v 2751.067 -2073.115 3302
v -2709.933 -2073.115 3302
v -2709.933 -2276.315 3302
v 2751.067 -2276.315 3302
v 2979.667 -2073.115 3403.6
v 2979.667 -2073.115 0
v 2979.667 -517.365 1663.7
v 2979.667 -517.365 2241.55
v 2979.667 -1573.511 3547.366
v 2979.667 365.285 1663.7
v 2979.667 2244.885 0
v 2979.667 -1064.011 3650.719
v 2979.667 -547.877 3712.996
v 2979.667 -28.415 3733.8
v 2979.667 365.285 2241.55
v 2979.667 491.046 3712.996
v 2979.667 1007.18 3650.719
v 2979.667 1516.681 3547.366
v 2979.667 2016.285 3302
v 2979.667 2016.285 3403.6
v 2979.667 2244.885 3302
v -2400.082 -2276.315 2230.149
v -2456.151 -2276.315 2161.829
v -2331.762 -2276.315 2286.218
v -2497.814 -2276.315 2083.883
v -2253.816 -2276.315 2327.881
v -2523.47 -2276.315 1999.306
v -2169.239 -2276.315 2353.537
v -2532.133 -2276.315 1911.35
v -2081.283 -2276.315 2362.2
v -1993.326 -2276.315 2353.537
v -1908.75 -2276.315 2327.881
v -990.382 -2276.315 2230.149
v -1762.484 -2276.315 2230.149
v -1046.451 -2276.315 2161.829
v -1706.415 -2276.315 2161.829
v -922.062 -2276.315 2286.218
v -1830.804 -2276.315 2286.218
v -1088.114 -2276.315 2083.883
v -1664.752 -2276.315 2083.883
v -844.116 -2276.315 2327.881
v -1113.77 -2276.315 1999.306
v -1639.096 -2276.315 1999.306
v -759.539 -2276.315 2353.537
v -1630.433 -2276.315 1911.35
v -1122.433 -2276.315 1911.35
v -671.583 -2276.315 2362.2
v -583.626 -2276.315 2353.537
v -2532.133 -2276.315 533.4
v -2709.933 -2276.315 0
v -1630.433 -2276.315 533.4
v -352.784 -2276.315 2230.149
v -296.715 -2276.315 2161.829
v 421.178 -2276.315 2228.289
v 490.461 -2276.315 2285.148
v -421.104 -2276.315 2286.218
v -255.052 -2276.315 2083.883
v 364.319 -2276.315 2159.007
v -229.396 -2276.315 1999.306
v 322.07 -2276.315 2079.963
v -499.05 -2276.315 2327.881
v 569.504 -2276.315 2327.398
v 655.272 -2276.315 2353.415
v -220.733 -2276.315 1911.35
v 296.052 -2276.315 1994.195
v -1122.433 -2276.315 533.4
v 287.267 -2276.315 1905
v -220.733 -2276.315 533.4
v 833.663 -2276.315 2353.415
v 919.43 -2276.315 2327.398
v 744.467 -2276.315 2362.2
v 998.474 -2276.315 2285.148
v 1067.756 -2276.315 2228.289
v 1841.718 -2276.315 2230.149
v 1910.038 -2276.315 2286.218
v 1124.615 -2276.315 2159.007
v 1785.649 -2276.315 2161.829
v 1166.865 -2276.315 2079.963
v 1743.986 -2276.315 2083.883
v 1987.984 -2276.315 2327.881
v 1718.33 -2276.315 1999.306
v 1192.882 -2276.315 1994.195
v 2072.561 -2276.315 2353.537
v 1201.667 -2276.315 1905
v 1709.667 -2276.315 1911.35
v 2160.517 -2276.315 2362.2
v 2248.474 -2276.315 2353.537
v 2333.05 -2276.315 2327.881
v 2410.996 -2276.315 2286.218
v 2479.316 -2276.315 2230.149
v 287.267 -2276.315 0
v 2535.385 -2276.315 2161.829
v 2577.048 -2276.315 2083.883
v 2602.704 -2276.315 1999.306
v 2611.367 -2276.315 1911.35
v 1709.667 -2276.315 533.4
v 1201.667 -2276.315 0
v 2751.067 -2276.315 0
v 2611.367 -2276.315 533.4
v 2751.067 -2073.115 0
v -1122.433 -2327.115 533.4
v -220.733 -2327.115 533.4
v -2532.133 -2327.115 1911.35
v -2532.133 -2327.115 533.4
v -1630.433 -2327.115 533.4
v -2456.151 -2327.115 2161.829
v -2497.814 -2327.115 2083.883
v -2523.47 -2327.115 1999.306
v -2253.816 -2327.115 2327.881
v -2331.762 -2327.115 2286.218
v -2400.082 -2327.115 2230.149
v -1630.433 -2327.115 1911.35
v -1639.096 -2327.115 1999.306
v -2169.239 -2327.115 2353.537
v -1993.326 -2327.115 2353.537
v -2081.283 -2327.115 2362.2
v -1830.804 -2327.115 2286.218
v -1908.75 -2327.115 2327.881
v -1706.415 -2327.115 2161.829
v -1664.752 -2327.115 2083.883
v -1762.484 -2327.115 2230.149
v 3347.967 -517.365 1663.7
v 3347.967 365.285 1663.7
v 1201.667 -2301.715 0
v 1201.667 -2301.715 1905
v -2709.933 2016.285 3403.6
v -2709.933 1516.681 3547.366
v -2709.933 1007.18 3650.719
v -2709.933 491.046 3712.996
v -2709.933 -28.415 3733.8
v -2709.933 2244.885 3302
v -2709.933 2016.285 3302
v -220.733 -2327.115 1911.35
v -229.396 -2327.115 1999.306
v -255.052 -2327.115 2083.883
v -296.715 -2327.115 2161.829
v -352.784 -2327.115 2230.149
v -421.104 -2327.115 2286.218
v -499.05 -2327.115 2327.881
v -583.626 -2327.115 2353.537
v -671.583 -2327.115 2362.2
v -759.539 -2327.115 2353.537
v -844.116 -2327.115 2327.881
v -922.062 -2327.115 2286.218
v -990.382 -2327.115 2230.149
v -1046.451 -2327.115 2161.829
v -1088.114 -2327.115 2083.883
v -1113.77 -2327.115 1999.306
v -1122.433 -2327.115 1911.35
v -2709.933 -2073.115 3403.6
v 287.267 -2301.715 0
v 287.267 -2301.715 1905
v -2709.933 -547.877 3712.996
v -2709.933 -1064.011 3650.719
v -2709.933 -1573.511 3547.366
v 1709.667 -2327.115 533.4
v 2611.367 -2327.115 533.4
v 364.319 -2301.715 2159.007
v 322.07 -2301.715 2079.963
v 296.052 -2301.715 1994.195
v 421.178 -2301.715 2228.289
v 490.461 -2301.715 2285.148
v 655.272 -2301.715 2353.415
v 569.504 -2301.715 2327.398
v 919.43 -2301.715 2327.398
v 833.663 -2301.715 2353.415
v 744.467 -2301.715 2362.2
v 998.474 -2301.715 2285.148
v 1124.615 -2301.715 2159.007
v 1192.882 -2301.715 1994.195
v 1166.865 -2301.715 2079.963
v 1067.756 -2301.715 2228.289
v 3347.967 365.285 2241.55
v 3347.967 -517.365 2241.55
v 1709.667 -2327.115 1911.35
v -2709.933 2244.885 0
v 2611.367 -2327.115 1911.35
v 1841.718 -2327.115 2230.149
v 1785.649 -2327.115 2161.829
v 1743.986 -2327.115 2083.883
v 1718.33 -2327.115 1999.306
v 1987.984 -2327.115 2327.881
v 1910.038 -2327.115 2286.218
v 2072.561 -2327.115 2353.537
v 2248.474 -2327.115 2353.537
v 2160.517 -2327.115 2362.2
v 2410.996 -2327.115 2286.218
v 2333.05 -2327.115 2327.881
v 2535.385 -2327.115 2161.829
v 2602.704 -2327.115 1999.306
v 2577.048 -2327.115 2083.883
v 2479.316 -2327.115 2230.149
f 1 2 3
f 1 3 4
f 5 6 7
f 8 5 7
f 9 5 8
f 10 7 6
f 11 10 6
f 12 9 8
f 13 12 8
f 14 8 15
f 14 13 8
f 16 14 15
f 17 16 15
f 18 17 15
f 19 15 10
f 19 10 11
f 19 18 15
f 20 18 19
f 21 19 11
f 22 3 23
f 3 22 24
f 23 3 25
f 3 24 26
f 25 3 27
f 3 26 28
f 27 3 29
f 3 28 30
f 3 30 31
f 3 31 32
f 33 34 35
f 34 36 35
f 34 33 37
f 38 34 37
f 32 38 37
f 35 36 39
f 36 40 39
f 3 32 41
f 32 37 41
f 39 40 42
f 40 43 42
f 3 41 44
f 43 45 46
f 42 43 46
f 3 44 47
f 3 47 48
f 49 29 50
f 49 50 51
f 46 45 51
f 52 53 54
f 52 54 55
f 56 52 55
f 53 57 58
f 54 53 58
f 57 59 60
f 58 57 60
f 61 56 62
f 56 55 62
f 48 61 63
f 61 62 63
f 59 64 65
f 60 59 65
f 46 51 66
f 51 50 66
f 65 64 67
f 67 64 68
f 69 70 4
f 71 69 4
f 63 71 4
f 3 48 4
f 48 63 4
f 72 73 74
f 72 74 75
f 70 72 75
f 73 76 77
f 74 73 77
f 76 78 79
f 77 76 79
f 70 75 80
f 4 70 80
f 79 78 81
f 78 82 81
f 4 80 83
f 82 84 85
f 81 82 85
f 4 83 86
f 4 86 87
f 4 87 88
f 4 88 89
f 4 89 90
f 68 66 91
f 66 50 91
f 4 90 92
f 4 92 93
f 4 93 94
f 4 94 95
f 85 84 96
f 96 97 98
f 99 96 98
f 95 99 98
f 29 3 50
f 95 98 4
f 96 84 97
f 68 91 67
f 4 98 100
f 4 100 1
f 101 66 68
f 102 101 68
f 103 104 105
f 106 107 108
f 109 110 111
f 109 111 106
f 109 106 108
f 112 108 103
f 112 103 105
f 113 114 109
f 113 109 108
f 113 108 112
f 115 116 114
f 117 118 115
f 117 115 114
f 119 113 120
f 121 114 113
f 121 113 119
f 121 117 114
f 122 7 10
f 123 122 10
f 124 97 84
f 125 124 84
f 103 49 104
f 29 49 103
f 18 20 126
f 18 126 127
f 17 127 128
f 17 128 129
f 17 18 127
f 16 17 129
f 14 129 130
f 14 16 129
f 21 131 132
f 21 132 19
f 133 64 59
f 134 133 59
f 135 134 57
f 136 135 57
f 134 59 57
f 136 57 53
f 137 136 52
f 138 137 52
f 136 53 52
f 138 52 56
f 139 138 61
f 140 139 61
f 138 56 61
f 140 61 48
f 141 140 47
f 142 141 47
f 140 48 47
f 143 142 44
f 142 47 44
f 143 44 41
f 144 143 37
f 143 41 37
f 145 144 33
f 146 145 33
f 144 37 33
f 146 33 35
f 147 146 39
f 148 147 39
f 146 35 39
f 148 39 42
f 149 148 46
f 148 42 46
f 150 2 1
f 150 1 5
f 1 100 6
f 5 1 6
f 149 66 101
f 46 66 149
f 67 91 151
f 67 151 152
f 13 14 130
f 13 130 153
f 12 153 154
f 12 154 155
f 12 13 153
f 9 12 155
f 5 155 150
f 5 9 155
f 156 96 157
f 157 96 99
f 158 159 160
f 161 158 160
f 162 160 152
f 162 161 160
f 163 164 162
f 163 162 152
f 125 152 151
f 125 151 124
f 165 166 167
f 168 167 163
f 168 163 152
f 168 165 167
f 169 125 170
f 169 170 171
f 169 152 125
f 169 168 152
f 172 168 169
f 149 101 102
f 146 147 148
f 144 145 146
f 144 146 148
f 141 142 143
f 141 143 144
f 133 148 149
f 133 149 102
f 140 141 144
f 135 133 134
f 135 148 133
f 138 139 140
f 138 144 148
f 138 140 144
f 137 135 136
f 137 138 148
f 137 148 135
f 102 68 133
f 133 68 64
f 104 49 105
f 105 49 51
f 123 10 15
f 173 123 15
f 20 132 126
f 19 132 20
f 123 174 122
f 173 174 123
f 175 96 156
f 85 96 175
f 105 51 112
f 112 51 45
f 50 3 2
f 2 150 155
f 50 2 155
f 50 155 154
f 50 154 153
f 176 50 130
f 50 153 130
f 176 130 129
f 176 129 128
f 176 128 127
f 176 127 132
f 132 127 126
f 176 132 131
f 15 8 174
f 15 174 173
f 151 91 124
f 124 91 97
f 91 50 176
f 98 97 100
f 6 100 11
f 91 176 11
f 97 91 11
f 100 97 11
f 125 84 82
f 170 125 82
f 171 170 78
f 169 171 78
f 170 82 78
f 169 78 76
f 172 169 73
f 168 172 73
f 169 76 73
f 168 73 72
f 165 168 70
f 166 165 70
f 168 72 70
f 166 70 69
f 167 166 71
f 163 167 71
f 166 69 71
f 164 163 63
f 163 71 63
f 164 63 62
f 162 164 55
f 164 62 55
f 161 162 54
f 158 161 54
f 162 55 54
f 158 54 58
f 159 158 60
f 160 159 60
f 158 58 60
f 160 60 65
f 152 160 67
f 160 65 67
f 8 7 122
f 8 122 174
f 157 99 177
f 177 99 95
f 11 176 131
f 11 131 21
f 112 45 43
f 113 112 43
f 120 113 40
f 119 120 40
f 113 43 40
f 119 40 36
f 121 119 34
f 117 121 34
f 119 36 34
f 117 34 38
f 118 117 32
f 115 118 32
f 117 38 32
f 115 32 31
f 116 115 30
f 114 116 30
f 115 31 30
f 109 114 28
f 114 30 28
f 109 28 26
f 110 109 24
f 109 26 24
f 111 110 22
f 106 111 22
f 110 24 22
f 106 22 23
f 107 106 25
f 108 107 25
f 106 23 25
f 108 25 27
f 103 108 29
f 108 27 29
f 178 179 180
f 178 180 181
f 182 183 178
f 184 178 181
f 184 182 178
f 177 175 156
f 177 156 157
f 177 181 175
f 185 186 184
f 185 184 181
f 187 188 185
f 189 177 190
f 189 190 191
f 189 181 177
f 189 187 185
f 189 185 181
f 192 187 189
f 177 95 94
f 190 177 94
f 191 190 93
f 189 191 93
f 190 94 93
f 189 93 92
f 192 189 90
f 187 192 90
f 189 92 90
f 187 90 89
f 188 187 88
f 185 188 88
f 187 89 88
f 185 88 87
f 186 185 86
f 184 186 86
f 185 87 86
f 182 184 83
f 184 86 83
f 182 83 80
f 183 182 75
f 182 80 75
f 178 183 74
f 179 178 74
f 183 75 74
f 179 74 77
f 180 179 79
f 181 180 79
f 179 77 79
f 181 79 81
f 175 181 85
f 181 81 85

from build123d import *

# Parameters (mm, degrees)
F0_W      = 5689.6
F0_H      = 4521.2
F1_DEPTH  = 3302
F2_W      = 5689.6
F2_H      = 4089.4
F3_DEPTH  = 101.6
F5_DEPTH  = 5689.6
F6_W      = 882.65
F6_H      = 577.85
F7_DEPTH  = 368.3
F8_W      = 228.6
F8_H      = 3302
F9_DEPTH  = 203.2
F8_W_2    = 901.7
F8_H_2    = 1377.95
F10_DEPTH = 50.8
F8_W_3    = 914.4
F8_H_3    = 1905
F11_DEPTH = 25.4


with BuildPart() as f1:
    # F0 (on Top) → F1 (new body)
    with BuildSketch(Plane.XY):
        with Locations((134.867244, -15.715256)):
            Rectangle(F0_W, F0_H)
    extrude(amount=F1_DEPTH)

    # F2 (on face) → F3 (join)
    with BuildSketch(Plane.XY.offset(3302)):
        with Locations((134.867244, -28.415256)):
            Rectangle(F2_W, F2_H)
    extrude(amount=F3_DEPTH)

    # F4 (on face) → F5 (join, through all)
    with BuildSketch(Plane.YZ.offset(2979.667244)):
        with BuildLine():
            Line((-28.415256, 3403.6), (2016.284744, 3403.6))
            ThreePointArc((2016.284744, 3403.6), (1007.179999, 3650.718695), (-28.415256, 3733.8))
            Line((-28.415256, 3733.8), (-28.415256, 3403.6))
        make_face()
        with BuildLine():
            Line((-28.415256, 3403.6), (-28.415256, 3733.8))
            ThreePointArc((-28.415256, 3733.8), (-1064.010511, 3650.718695), (-2073.115256, 3403.6))
            Line((-2073.115256, 3403.6), (-28.415256, 3403.6))
        make_face()
    extrude(amount=-F5_DEPTH)

    # F6 (on face) → F7 (join)
    with BuildSketch(Plane.YZ.offset(2979.667244)):
        with Locations((-76.040256, 1952.625)):
            Rectangle(F6_W, F6_H)
    extrude(amount=F7_DEPTH)

    # F8 (on face) → F9 (cut, through all)
    with BuildSketch(Plane.XZ.offset(2276.315256)):
        with Locations((2865.367244, 1651)):
            Rectangle(F8_W, F8_H)
    extrude(amount=-F9_DEPTH, mode=Mode.SUBTRACT)

    # F8 (on face) → F10 (join)
    with BuildSketch(Plane.XZ.offset(2276.315256)):
        with Locations((-2081.282756, 1222.375)):
            Rectangle(F8_W_2, F8_H_2)
        with BuildLine():
            ThreePointArc((-1630.432756, 1911.35), (-2081.282756, 2362.2), (-2532.132756, 1911.35))
            Line((-2532.132756, 1911.35), (-1630.432756, 1911.35))
        make_face()
        with Locations((-671.582756, 1222.375)):
            Rectangle(F8_W_2, F8_H_2)
        with BuildLine():
            ThreePointArc((-220.732756, 1911.35), (-671.582756, 2362.2), (-1122.432756, 1911.35))
            Line((-1122.432756, 1911.35), (-220.732756, 1911.35))
        make_face()
        with Locations((2160.517244, 1222.375)):
            Rectangle(F8_W_2, F8_H_2)
        with BuildLine():
            ThreePointArc((2611.367244, 1911.35), (2160.517244, 2362.2), (1709.667244, 1911.35))
            Line((1709.667244, 1911.35), (2611.367244, 1911.35))
        make_face()
    extrude(amount=F10_DEPTH)

    # F8 (on face) → F11 (join)
    with BuildSketch(Plane.XZ.offset(2276.315256)):
        with Locations((744.467244, 952.5)):
            Rectangle(F8_W_3, F8_H_3)
        with BuildLine():
            ThreePointArc((1201.667244, 1905), (744.467244, 2362.2), (287.267244, 1905))
            Line((287.267244, 1905), (1201.667244, 1905))
        make_face()
    extrude(amount=F11_DEPTH)


solid = f1.part
